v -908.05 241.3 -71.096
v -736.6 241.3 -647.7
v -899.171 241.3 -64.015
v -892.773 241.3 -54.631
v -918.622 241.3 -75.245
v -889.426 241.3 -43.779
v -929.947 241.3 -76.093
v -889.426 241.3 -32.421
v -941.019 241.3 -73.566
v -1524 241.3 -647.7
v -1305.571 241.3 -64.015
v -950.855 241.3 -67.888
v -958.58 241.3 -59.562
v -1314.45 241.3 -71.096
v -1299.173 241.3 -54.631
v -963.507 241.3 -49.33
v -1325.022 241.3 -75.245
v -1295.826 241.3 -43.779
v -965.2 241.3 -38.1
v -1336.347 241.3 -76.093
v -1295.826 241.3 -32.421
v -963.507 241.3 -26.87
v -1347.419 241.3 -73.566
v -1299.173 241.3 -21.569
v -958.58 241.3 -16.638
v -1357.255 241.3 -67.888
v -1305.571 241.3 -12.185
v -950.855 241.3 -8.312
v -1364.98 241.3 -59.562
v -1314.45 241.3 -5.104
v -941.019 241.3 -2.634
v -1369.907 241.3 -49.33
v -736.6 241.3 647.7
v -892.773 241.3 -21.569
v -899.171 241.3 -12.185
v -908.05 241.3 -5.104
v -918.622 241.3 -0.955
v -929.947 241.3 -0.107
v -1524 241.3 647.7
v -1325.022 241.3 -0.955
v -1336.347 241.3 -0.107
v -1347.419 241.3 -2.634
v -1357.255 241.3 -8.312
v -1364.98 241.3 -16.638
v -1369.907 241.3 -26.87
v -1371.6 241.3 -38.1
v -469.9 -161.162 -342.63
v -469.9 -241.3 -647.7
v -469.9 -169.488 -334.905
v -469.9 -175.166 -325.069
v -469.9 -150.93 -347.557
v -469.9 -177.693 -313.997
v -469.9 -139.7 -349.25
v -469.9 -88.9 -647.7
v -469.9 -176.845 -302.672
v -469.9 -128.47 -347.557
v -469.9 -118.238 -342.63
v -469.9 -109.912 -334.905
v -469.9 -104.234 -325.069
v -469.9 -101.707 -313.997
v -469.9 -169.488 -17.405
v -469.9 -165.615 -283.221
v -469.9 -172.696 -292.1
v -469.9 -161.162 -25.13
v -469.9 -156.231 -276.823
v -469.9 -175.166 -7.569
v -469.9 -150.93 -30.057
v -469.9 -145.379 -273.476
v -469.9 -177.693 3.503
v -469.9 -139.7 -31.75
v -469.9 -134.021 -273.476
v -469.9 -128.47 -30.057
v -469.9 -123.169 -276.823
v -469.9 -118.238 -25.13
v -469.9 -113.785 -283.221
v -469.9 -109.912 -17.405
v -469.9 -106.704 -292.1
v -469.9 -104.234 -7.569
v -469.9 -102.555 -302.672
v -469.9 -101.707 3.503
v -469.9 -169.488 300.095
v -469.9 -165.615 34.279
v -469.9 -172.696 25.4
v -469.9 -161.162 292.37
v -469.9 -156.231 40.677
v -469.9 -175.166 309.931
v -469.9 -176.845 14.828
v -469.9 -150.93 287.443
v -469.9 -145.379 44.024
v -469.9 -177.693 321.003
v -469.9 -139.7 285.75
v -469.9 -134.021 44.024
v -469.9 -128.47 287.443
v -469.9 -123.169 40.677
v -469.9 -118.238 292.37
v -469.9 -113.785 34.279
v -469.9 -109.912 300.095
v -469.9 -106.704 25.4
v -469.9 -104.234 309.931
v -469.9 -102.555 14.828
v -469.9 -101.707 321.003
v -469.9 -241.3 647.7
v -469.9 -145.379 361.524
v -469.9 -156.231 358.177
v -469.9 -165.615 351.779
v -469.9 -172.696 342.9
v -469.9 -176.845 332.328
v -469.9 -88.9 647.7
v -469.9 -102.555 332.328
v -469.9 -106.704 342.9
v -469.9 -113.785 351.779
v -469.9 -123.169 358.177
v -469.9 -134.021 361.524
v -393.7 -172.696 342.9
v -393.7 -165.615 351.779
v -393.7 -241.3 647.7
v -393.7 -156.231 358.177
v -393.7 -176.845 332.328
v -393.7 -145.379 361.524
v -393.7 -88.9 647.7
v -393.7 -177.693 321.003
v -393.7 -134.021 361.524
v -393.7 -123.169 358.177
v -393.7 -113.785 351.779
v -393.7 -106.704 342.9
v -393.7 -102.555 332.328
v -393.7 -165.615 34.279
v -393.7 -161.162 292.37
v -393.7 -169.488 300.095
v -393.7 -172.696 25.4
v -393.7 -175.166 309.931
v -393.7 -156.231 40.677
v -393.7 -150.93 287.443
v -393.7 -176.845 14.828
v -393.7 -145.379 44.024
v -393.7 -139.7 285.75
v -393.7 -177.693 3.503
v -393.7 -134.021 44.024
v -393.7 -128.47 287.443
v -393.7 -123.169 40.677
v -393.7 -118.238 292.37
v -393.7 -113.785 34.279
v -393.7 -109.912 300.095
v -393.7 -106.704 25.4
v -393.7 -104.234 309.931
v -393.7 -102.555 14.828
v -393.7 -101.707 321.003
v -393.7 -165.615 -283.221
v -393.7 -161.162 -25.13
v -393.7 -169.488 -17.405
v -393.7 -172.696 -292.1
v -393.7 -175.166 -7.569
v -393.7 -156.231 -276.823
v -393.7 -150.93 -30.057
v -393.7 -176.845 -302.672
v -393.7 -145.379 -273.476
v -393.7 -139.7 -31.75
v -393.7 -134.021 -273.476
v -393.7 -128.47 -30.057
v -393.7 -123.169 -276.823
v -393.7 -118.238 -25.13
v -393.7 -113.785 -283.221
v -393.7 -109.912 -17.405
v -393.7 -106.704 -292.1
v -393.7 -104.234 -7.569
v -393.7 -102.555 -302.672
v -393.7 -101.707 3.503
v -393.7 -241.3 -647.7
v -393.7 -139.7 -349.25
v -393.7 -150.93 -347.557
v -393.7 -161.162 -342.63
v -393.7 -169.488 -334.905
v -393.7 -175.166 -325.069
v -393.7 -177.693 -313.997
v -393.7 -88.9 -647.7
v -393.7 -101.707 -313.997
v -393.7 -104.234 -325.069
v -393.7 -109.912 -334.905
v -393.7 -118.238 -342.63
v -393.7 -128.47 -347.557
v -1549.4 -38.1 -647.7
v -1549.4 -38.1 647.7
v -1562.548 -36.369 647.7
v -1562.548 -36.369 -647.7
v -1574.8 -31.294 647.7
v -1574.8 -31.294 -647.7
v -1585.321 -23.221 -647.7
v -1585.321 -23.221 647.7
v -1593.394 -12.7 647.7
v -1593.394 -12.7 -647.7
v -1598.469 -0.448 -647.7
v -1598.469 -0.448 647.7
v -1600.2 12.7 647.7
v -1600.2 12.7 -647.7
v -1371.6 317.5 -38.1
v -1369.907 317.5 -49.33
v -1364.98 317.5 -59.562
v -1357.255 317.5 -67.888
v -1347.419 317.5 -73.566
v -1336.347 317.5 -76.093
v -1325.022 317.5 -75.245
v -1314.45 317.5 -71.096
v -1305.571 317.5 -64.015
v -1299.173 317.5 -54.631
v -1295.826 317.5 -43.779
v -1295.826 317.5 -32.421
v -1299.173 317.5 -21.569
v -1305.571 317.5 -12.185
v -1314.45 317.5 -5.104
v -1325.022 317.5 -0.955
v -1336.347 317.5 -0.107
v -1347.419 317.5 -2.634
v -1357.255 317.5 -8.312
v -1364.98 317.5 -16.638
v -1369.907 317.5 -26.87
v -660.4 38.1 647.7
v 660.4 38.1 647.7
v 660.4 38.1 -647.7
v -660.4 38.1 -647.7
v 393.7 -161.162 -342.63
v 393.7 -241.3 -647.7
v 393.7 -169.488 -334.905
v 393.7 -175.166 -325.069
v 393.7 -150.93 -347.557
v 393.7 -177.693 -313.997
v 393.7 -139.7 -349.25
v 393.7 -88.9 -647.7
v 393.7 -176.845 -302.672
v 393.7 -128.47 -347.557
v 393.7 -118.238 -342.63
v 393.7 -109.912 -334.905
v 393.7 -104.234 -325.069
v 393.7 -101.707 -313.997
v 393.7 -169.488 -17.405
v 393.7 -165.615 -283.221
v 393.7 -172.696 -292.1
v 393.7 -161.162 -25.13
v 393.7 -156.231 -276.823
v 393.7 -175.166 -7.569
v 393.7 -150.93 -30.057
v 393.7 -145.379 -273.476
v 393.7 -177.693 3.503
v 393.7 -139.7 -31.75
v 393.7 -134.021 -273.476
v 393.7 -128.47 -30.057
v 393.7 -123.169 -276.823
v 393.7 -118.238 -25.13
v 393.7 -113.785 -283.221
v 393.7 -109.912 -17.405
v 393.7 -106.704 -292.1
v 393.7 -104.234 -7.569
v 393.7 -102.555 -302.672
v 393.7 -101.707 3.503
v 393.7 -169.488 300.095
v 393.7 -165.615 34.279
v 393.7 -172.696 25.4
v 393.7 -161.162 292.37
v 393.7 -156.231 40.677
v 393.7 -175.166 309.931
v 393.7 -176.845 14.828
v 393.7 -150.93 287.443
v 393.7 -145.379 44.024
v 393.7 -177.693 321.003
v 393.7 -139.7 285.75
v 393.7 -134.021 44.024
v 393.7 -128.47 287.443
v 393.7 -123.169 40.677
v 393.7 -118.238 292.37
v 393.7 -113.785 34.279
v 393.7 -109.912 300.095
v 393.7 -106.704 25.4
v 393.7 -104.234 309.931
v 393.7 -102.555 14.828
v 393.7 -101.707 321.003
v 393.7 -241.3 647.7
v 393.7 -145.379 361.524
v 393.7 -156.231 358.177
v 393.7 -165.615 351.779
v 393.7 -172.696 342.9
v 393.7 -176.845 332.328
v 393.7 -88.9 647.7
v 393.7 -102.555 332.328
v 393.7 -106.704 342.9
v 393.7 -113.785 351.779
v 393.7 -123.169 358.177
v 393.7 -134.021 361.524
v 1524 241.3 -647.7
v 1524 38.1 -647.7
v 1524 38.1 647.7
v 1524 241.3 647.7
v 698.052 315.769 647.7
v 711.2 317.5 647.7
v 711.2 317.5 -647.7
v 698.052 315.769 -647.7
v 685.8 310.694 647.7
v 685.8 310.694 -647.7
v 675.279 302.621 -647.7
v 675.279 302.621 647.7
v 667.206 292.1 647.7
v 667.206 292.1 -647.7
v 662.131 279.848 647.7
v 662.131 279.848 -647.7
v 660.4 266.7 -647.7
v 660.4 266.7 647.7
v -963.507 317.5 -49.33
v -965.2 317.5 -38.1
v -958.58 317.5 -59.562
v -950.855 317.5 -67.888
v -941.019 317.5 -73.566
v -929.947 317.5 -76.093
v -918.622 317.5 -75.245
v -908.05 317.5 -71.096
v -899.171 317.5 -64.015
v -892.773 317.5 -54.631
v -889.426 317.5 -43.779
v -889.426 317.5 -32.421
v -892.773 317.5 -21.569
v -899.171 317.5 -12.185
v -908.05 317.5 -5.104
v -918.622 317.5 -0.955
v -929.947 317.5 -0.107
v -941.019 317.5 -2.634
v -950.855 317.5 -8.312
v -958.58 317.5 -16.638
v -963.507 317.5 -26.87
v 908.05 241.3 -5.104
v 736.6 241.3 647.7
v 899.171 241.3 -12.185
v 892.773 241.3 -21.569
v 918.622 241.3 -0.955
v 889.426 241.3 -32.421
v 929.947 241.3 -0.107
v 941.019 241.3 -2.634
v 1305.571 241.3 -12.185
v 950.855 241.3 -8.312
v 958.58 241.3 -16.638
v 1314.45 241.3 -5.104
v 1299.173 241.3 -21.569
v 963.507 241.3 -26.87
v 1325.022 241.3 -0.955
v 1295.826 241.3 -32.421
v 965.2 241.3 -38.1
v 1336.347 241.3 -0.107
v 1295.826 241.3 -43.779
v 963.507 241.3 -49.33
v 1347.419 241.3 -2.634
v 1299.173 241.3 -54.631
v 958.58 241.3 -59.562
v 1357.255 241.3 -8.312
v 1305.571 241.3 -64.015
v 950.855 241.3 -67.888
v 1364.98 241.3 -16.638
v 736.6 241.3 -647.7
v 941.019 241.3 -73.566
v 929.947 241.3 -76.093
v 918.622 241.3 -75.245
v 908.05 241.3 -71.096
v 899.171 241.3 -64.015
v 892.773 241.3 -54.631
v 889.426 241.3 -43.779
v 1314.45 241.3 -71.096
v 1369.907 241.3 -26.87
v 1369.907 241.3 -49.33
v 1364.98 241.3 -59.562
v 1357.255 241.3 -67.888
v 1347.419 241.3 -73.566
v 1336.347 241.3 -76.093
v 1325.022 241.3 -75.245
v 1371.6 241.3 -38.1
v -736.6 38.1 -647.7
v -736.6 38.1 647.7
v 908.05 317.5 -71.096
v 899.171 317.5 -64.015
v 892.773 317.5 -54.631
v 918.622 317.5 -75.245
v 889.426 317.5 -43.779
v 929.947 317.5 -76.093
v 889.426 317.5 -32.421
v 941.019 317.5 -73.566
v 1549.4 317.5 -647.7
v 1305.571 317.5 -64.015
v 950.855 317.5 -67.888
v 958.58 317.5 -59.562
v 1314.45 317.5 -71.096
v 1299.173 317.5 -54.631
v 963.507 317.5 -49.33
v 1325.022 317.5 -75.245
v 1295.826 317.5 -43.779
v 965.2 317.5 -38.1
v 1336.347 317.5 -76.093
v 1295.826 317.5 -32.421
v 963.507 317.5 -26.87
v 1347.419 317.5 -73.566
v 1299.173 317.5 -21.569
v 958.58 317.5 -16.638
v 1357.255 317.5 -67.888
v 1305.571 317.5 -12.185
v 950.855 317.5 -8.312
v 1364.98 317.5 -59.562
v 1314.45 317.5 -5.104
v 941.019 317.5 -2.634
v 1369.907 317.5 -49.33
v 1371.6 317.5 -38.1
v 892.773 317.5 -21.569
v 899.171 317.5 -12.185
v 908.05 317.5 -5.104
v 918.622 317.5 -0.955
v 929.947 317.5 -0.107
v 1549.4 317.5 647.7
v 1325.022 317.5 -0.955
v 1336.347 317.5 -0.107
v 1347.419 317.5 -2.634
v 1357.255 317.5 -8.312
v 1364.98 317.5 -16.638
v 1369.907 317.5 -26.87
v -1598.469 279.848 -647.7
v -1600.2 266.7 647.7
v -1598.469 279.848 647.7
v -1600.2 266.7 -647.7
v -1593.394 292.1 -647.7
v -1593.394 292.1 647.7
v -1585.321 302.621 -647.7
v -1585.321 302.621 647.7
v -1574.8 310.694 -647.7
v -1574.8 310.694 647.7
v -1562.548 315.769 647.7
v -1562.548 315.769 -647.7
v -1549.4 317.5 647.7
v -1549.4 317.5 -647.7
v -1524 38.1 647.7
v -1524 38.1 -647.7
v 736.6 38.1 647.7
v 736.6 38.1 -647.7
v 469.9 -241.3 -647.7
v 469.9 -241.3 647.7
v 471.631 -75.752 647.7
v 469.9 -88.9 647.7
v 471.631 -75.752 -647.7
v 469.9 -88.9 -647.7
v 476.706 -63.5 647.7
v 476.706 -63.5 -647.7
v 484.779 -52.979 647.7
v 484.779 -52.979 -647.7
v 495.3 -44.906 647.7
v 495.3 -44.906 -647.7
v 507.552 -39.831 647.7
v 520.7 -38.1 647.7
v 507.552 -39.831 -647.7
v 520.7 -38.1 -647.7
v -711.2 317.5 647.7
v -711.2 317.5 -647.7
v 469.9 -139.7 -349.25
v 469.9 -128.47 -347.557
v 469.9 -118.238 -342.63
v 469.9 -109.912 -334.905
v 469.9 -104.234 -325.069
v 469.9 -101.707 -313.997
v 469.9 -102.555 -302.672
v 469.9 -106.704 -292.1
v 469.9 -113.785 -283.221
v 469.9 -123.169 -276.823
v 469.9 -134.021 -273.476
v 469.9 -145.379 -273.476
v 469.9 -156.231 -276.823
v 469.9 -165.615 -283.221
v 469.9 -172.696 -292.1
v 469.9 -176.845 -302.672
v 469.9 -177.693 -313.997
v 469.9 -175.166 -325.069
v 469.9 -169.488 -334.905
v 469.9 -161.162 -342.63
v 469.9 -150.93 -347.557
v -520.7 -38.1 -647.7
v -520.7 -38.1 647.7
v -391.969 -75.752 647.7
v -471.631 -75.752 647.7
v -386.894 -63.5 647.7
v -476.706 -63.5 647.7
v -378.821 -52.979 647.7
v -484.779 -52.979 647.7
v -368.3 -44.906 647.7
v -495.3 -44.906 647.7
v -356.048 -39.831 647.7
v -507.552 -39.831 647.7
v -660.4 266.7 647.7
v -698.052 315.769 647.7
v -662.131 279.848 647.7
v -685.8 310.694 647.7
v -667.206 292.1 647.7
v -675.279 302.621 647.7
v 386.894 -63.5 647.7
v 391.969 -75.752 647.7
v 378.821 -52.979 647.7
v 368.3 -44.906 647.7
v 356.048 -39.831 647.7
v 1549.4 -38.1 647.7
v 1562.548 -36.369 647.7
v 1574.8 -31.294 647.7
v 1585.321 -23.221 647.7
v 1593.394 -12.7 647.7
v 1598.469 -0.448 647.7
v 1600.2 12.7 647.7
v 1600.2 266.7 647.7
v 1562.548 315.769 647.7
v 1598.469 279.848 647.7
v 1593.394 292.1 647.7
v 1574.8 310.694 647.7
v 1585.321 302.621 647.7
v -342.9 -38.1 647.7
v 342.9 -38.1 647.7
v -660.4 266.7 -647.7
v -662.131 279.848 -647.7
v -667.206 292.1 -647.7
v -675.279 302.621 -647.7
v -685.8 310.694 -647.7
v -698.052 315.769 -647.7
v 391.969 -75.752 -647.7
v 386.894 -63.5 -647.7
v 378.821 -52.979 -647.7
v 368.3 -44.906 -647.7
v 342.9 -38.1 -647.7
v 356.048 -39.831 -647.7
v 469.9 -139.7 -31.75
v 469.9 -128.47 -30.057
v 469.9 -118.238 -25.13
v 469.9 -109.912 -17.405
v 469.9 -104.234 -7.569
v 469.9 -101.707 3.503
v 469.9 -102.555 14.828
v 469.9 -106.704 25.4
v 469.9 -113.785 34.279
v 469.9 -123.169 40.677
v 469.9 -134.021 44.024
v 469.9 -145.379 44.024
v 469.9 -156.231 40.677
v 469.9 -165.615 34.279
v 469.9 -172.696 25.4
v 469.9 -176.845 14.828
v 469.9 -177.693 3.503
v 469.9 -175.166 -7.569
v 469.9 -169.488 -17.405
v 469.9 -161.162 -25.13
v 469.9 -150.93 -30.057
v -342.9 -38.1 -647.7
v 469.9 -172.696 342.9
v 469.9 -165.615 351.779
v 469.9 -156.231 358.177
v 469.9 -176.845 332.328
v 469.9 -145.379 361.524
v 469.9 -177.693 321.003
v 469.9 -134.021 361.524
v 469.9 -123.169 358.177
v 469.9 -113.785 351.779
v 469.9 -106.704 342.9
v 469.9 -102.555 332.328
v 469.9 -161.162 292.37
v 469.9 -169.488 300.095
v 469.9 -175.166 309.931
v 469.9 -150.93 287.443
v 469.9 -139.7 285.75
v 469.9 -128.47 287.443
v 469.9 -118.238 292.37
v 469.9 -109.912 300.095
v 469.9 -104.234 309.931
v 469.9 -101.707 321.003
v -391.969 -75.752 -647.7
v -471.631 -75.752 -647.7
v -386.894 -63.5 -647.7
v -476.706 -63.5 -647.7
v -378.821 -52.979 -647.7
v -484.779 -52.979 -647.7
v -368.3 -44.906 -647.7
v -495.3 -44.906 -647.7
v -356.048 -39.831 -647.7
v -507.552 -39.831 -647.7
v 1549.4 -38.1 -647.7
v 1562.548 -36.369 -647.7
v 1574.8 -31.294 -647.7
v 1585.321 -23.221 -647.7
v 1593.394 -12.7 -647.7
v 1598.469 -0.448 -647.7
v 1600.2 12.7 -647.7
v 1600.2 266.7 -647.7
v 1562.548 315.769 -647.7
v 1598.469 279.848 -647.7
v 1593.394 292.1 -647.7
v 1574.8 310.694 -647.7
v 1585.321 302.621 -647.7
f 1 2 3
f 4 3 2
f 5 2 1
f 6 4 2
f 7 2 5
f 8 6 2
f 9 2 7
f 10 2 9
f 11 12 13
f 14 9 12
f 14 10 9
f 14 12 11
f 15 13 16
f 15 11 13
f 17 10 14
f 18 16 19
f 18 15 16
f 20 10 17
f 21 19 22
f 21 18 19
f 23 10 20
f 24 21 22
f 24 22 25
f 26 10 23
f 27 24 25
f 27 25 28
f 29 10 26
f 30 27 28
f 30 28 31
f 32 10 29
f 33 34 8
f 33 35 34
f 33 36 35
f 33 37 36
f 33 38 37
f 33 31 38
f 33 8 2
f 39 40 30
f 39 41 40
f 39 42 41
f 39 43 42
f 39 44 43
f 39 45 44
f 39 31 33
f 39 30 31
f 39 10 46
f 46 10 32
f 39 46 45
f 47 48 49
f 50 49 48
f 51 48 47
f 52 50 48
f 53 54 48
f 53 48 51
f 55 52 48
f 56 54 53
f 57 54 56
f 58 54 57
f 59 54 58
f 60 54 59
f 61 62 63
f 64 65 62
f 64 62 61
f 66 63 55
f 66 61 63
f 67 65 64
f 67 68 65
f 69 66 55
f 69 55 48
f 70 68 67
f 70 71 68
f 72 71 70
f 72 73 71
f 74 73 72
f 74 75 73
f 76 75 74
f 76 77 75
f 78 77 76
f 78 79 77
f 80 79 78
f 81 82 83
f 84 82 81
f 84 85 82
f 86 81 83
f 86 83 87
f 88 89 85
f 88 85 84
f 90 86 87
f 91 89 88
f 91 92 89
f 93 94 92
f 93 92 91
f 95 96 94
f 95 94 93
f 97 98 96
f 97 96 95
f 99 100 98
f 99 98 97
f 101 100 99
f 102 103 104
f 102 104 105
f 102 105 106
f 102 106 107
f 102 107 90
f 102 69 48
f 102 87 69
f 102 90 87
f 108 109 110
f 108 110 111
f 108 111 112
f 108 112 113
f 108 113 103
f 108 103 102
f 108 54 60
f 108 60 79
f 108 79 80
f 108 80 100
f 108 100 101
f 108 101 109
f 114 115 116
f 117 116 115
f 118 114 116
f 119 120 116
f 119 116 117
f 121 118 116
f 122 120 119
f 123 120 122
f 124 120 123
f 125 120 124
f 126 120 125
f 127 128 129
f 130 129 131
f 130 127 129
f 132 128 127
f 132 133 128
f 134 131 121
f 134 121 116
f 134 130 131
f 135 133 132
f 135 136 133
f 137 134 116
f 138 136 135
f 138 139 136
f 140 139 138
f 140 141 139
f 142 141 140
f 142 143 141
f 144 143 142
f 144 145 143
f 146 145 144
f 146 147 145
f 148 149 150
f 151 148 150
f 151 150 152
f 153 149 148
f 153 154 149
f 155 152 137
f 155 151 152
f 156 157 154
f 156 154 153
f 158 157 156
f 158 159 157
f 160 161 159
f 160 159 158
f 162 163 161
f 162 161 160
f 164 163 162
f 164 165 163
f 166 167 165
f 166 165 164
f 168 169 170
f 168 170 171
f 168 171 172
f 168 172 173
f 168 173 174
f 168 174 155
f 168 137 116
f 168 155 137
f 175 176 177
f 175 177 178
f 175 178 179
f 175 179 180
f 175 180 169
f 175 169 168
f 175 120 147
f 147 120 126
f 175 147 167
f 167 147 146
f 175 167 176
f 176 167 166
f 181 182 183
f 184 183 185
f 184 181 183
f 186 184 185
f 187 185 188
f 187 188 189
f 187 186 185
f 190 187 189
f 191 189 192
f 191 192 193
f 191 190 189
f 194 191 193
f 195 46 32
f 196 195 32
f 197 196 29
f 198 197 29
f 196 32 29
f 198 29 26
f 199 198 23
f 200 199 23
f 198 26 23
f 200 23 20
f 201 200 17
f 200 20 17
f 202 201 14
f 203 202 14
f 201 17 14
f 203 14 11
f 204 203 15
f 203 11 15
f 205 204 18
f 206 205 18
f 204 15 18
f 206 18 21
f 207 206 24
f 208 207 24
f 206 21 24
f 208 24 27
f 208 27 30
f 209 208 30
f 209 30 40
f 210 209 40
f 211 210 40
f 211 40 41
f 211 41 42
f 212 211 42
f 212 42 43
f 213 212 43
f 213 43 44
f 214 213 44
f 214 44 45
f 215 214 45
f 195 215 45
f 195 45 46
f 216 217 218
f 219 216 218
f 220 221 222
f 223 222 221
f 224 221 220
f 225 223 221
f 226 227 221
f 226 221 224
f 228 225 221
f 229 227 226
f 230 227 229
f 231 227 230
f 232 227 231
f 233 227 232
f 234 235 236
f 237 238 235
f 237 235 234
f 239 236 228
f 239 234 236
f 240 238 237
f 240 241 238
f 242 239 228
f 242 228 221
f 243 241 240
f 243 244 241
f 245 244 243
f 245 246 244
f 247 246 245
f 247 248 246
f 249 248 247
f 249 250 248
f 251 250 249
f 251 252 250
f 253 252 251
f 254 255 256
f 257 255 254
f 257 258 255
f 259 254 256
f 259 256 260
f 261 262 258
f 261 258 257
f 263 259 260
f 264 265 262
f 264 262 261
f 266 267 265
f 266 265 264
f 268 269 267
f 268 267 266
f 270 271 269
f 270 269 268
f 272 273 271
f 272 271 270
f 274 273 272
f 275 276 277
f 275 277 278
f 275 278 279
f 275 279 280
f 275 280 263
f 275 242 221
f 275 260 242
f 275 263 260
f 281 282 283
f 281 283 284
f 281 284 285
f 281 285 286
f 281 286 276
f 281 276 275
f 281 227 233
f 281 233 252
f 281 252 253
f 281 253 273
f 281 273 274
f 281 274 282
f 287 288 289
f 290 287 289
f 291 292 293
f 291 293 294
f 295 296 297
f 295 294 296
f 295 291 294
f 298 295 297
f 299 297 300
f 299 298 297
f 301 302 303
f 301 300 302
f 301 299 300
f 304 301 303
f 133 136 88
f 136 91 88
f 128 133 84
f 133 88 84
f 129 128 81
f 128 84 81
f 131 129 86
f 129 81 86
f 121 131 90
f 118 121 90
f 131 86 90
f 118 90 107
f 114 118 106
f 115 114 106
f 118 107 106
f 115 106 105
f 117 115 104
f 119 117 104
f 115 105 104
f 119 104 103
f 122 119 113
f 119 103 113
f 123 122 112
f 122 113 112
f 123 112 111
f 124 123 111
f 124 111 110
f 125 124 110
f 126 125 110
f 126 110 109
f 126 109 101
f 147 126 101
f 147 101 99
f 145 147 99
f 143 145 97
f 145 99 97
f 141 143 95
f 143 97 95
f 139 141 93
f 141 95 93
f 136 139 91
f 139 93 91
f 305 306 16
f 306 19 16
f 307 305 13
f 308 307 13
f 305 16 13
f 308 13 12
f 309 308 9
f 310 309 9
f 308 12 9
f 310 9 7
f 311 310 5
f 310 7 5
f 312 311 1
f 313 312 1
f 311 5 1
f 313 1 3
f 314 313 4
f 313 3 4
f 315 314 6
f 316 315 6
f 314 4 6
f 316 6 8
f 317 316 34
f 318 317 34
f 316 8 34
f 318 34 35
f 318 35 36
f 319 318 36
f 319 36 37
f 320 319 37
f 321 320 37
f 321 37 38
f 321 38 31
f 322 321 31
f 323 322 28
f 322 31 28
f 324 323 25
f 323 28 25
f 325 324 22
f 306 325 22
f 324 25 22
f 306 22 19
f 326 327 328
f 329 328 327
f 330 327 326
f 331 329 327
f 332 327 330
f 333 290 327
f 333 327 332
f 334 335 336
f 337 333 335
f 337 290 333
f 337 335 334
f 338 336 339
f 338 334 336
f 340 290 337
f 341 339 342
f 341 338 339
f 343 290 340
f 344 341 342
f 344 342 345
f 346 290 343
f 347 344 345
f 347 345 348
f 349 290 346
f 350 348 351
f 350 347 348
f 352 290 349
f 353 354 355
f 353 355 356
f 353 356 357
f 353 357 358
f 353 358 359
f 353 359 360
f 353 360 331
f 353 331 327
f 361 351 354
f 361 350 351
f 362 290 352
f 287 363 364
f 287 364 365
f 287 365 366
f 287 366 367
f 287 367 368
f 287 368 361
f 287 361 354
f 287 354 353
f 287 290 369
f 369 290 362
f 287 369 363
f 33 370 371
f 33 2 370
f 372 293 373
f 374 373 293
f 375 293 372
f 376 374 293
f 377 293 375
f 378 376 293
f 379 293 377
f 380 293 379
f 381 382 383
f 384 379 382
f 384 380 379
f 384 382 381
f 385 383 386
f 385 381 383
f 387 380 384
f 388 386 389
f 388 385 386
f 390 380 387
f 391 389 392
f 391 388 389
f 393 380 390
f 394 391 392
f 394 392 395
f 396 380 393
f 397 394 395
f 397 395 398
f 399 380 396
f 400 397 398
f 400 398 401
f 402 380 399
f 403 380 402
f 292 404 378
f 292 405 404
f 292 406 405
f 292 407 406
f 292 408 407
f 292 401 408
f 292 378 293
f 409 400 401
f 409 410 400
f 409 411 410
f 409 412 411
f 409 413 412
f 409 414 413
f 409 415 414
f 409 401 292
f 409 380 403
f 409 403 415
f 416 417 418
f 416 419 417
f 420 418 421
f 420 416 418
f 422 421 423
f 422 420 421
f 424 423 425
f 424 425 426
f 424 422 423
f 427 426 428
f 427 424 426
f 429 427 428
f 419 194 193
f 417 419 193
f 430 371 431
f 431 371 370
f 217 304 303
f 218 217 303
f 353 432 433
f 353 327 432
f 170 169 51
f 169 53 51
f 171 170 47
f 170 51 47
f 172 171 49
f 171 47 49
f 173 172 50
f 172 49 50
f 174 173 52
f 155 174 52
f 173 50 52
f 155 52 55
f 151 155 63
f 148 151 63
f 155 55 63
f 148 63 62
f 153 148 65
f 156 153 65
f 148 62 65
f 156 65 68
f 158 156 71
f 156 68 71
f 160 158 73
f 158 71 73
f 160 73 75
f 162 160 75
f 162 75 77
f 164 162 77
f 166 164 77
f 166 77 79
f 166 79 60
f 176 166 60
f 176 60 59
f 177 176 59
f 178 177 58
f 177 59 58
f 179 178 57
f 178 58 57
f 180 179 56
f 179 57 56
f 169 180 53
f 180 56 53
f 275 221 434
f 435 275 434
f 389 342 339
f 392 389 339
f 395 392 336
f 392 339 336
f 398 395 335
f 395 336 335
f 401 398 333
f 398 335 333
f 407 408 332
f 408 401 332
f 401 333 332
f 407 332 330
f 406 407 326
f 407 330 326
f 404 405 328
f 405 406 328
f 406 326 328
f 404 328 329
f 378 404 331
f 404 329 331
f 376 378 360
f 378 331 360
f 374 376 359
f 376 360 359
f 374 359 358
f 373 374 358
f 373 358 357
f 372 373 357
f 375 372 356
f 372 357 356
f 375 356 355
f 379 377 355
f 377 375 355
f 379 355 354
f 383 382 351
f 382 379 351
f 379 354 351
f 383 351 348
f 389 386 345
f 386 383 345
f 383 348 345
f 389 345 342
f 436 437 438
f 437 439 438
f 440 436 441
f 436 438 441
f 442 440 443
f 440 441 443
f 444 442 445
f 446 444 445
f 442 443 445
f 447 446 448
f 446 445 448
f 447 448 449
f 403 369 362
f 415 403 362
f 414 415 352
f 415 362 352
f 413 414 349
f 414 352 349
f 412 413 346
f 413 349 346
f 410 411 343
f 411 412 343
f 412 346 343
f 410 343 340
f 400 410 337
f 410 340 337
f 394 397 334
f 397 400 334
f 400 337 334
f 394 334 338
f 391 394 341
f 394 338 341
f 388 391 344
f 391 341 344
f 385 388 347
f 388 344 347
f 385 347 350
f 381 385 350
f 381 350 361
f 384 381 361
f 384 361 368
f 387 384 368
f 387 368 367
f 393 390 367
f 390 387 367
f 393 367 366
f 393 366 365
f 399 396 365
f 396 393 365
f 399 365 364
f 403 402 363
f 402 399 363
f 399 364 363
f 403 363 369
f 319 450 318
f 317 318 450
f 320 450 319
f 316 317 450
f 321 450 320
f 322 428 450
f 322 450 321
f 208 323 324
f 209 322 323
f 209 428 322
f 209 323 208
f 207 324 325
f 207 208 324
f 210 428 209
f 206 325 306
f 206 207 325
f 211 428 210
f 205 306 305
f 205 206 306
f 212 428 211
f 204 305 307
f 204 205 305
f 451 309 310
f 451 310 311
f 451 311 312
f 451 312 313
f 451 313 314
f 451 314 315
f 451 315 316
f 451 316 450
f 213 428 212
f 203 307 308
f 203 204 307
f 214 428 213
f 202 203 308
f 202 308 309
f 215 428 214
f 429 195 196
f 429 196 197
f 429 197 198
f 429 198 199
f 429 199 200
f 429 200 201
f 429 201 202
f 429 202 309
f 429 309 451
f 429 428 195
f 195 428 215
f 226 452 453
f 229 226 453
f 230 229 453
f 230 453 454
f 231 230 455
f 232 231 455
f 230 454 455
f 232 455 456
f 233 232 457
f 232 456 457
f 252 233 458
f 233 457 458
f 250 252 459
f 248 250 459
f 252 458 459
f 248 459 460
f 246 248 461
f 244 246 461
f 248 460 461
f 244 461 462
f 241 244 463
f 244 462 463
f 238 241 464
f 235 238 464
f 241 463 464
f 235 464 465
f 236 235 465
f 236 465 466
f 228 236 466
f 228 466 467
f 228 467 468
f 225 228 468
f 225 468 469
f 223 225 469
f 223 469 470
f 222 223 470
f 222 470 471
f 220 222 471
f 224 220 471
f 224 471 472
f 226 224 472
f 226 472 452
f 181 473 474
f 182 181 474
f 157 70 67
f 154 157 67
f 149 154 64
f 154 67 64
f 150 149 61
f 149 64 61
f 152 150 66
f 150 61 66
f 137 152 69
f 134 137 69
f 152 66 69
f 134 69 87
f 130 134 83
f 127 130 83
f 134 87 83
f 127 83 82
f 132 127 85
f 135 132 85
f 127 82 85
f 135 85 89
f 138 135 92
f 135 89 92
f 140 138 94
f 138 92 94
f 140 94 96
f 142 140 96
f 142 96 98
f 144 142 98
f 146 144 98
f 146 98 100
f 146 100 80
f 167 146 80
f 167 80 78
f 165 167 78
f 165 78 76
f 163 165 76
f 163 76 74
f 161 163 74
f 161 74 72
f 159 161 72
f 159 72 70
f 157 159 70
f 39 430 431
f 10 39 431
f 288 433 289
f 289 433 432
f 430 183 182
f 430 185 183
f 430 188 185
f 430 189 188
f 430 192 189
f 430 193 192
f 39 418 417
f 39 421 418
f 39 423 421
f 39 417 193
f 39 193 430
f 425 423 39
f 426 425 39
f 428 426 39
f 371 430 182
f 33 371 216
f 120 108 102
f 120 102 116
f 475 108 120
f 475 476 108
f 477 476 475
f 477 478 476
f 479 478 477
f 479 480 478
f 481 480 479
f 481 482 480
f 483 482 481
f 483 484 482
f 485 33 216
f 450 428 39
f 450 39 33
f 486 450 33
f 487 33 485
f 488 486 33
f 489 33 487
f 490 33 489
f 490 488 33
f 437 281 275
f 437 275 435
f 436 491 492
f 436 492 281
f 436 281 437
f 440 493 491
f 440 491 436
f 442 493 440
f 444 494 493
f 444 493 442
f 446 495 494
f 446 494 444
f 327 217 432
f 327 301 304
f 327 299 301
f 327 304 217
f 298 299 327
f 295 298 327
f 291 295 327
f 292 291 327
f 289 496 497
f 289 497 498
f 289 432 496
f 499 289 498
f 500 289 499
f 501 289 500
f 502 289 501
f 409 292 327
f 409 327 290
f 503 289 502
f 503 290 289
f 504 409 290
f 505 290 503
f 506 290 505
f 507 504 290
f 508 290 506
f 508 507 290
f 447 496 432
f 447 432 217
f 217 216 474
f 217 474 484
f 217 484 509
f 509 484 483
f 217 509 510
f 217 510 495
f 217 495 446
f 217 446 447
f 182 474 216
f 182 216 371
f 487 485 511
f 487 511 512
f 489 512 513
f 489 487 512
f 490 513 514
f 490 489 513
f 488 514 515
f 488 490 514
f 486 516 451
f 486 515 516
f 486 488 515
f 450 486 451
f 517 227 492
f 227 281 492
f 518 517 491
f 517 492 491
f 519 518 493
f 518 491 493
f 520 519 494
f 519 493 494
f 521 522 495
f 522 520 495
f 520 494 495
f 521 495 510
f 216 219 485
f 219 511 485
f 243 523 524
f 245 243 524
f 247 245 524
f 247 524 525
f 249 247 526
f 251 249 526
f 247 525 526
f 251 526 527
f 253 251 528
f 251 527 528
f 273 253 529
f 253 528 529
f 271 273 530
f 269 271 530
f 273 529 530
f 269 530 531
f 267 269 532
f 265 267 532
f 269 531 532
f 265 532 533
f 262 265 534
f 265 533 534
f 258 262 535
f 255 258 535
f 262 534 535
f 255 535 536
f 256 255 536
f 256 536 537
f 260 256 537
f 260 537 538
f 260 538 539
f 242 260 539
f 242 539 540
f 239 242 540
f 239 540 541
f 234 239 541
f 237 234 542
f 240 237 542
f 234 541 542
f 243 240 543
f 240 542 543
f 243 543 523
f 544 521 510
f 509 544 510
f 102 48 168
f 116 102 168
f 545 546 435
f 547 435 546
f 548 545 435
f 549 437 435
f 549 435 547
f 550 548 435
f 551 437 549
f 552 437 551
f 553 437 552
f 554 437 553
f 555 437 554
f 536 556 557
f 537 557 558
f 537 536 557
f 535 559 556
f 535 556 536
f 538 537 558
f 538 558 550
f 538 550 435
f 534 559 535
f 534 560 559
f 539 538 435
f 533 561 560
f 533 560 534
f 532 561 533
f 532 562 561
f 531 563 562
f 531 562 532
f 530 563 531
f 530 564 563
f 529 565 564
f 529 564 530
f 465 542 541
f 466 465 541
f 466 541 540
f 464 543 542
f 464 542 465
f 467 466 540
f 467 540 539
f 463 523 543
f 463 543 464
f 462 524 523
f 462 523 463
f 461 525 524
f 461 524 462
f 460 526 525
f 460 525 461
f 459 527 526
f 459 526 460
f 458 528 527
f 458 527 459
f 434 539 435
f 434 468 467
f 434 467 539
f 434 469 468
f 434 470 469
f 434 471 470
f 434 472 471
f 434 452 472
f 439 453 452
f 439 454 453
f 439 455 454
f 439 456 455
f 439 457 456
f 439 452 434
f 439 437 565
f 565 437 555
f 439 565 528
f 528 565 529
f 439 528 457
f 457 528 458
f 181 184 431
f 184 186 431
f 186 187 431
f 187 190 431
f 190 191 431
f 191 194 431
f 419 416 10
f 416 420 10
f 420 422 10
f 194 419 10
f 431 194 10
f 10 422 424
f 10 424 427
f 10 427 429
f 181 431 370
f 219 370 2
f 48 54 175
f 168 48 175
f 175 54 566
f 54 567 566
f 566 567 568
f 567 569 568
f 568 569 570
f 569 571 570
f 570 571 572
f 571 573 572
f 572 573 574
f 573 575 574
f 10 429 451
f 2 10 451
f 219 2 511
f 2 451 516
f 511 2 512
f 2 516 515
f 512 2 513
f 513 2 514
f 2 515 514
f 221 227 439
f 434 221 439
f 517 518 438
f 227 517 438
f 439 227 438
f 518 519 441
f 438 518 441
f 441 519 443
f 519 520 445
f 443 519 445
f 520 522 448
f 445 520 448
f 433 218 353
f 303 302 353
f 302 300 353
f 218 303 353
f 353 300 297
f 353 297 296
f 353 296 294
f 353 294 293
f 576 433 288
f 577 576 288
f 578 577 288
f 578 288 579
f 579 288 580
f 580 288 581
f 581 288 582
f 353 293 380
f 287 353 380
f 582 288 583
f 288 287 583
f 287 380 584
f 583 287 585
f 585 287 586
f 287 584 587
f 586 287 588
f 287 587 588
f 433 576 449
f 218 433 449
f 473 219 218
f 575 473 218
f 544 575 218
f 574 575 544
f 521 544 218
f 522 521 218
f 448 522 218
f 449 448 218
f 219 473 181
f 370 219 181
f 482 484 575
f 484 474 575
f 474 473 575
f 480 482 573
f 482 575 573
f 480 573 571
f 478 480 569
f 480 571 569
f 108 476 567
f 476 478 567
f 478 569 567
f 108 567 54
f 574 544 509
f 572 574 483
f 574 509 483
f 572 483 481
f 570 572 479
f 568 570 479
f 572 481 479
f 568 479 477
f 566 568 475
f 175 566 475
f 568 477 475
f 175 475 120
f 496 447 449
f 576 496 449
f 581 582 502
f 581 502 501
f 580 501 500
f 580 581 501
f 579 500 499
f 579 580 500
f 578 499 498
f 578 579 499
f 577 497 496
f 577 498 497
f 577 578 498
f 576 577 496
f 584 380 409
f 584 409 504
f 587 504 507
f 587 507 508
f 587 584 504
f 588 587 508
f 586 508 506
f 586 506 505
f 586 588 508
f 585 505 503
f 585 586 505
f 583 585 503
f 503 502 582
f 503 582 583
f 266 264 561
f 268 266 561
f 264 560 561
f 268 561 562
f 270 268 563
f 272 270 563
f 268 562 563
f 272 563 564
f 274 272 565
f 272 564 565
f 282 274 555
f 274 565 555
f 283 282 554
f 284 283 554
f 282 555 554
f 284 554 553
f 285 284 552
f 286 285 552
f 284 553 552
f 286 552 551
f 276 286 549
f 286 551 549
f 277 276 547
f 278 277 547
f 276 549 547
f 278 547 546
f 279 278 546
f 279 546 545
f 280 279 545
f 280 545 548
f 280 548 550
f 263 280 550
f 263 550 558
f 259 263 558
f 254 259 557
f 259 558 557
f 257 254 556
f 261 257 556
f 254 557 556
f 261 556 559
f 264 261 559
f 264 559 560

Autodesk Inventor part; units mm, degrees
ref_plane "YZ Plane" through (0, 0, 0) normal (1, 0, 0) x (0, 1, 0)
ref_plane "XZ Plane" through (0, 0, 0) normal (0, 1, 0) x (-1, 0, 0)
ref_plane "XY Plane" through (0, 0, 0) normal (0, 0, 1) x (1, 0, 0)
sketch "Sketch1" plane through (0, 0, 0) normal (1, 0, 0) x (0, 1, 0)
  line L0 (38.1, 647.7) -> (-38.1, 647.7)
  line L1 (-38.1, 647.7) -> (-38.1, -647.7)
  line L2 (-38.1, -647.7) -> (38.1, -647.7)
  line L3 (38.1, -647.7) -> (38.1, 647.7)
  line L4 (0, 0) -> (486.9553, 0) construction
  point P0 (0, -647.7)
  dimension "d0" = 1295.4
  dimension "d1" = 76.2
  dimension "d2" = 647.7
extrude "Extrusion1" add sketch "Sketch1" along normal blind 1600.2
sketch "Sketch2" plane through (0, 38.1, 647.7) normal (0, 1, 0) x (1, 0, 0)
  line L0 (1600.2, 0) -> (1600.2, 1295.4) projected
  line L1 (0, 0) -> (1600.2, 0) projected
  line L2 (1600.2, 1295.4) -> (1524, 1295.4)
  line L3 (1524, 1295.4) -> (1524, 0)
  line L4 (1524, 0) -> (1600.2, 0)
  line L5 (1600.2, 0) -> (1600.2, 1295.4)
  line L6 (1600.2, 1295.4) -> (1600.2, 0) projected
  point P0 (0, 647.7)
  dimension "d5" = 76.2
extrude "Extrusion2" add sketch "Sketch2" along normal blind 279.4
sketch "Sketch3" plane through (1524, 38.1, -647.7) normal (-1, 0, 0) x (0, 0, 1)
  line L0 (0, -76.2) -> (0, 279.4) projected
  line L1 (1295.4, -76.2) -> (1295.4, 279.4) projected
  line L2 (0, 279.4) -> (1295.4, 279.4)
  line L3 (1295.4, 279.4) -> (1295.4, 203.2)
  line L4 (1295.4, 203.2) -> (0, 203.2)
  line L5 (0, 203.2) -> (0, 279.4)
  point P0 (647.7, -38.1)
  dimension "d8" = 76.2
extrude "Extrusion3" add sketch "Sketch3" along normal blind 863.6
sketch "Sketch4" plane through (1524, 241.3, -647.7) normal (0, -1, 0) x (1, 0, 0)
  line L0 (-863.6, 1295.4) -> (-863.6, 0) projected
  line L1 (-1524, 0) -> (0, 0) projected
  line L2 (-863.6, 1295.4) -> (-787.4, 1295.4)
  line L3 (-787.4, 1295.4) -> (-787.4, 0)
  line L4 (-787.4, 0) -> (-863.6, 0)
  line L5 (-863.6, 0) -> (-863.6, 1295.4)
  point P0 (-1524, 647.7)
  dimension "d11" = 76.2
extrude "Extrusion4" add sketch "Sketch4" along normal up to next
sketch "Sketch5" plane through (0, -38.1, -647.7) normal (0, -1, 0) x (1, 0, 0)
  line L0 (0, 1295.4) -> (1600.2, 1295.4) projected
  line L1 (0, 0) -> (1600.2, 0) projected
  line L2 (393.7, 1295.4) -> (469.9, 1295.4)
  line L3 (469.9, 1295.4) -> (469.9, 0)
  line L4 (469.9, 0) -> (393.7, 0)
  line L5 (393.7, 0) -> (393.7, 1295.4)
  point P0 (0, 647.7)
  dimension "d14" = 76.2
  dimension "d15" = 469.9
extrude "Extrusion5" add sketch "Sketch5" along normal blind 203.2
sketch "Sketch6" plane through (469.9, -38.1, 647.7) normal (1, 0, 0) x (0, 0, -1)
  point P0 (647.7, 38.1)
sketch "Sketch7" plane through (469.9, -38.1, 647.7) normal (1, 0, 0) x (0, 0, -1)
  circle A0 centre (323.85, -101.6) radius 38.1
  line L0 (0, 0) -> (0, -203.2) projected
  line L1 (1295.4, -203.2) -> (0, -203.2) projected
  point P0 (647.7, 38.1)
  dimension "d18" = 76.2
  dimension "d19" = 323.85
  dimension "d20" = 101.6
extrude "Extrusion6" cut sketch "Sketch7" against normal through all
pattern_linear "Rectangular Pattern1" count 3 spacing 317.5 along (0, 0, -1) of "Extrusion6"
fillet "Fillet1" radius 50.8 1 edges at (393.7, -38.1, 0)
sketch "Sketch8" plane through (0, 317.5, 647.7) normal (0, 1, 0) x (1, 0, 0)
  circle A0 centre (927.1, 685.8) radius 38.1
  line L0 (1600.2, 0) -> (660.4, 0) projected
  line L1 (660.4, 0) -> (660.4, 1295.4) projected
  circle A1 centre (1333.5, 685.8) radius 38.1
  point P0 (0, 647.7)
  dimension "d28" = 76.2
  dimension "d29" = 685.8
  dimension "d30" = 266.7
  dimension "d31" = 76.2
  dimension "d32" = 406.4
extrude "Extrusion7" cut sketch "Sketch8" along normal up to surface (76.2 mm away) from surface at -76.2
fillet "Fillet3" radius 50.8 4 edges at (1600.2, 317.5, 0) (660.4, 317.5, 0) (1600.2, -38.1, 0) (469.9, -38.1, 0)
mirror "Mirror1" about plane through (0, 0, 0) normal (1, 0, 0) of "Extrusion1", "Extrusion2", "Extrusion3", "Extrusion4", "Extrusion5", "Extrusion6", "Rectangular Pattern1", "Fillet1", "Extrusion7", "Fillet3"
properties part number "Up_Part_Robot"
